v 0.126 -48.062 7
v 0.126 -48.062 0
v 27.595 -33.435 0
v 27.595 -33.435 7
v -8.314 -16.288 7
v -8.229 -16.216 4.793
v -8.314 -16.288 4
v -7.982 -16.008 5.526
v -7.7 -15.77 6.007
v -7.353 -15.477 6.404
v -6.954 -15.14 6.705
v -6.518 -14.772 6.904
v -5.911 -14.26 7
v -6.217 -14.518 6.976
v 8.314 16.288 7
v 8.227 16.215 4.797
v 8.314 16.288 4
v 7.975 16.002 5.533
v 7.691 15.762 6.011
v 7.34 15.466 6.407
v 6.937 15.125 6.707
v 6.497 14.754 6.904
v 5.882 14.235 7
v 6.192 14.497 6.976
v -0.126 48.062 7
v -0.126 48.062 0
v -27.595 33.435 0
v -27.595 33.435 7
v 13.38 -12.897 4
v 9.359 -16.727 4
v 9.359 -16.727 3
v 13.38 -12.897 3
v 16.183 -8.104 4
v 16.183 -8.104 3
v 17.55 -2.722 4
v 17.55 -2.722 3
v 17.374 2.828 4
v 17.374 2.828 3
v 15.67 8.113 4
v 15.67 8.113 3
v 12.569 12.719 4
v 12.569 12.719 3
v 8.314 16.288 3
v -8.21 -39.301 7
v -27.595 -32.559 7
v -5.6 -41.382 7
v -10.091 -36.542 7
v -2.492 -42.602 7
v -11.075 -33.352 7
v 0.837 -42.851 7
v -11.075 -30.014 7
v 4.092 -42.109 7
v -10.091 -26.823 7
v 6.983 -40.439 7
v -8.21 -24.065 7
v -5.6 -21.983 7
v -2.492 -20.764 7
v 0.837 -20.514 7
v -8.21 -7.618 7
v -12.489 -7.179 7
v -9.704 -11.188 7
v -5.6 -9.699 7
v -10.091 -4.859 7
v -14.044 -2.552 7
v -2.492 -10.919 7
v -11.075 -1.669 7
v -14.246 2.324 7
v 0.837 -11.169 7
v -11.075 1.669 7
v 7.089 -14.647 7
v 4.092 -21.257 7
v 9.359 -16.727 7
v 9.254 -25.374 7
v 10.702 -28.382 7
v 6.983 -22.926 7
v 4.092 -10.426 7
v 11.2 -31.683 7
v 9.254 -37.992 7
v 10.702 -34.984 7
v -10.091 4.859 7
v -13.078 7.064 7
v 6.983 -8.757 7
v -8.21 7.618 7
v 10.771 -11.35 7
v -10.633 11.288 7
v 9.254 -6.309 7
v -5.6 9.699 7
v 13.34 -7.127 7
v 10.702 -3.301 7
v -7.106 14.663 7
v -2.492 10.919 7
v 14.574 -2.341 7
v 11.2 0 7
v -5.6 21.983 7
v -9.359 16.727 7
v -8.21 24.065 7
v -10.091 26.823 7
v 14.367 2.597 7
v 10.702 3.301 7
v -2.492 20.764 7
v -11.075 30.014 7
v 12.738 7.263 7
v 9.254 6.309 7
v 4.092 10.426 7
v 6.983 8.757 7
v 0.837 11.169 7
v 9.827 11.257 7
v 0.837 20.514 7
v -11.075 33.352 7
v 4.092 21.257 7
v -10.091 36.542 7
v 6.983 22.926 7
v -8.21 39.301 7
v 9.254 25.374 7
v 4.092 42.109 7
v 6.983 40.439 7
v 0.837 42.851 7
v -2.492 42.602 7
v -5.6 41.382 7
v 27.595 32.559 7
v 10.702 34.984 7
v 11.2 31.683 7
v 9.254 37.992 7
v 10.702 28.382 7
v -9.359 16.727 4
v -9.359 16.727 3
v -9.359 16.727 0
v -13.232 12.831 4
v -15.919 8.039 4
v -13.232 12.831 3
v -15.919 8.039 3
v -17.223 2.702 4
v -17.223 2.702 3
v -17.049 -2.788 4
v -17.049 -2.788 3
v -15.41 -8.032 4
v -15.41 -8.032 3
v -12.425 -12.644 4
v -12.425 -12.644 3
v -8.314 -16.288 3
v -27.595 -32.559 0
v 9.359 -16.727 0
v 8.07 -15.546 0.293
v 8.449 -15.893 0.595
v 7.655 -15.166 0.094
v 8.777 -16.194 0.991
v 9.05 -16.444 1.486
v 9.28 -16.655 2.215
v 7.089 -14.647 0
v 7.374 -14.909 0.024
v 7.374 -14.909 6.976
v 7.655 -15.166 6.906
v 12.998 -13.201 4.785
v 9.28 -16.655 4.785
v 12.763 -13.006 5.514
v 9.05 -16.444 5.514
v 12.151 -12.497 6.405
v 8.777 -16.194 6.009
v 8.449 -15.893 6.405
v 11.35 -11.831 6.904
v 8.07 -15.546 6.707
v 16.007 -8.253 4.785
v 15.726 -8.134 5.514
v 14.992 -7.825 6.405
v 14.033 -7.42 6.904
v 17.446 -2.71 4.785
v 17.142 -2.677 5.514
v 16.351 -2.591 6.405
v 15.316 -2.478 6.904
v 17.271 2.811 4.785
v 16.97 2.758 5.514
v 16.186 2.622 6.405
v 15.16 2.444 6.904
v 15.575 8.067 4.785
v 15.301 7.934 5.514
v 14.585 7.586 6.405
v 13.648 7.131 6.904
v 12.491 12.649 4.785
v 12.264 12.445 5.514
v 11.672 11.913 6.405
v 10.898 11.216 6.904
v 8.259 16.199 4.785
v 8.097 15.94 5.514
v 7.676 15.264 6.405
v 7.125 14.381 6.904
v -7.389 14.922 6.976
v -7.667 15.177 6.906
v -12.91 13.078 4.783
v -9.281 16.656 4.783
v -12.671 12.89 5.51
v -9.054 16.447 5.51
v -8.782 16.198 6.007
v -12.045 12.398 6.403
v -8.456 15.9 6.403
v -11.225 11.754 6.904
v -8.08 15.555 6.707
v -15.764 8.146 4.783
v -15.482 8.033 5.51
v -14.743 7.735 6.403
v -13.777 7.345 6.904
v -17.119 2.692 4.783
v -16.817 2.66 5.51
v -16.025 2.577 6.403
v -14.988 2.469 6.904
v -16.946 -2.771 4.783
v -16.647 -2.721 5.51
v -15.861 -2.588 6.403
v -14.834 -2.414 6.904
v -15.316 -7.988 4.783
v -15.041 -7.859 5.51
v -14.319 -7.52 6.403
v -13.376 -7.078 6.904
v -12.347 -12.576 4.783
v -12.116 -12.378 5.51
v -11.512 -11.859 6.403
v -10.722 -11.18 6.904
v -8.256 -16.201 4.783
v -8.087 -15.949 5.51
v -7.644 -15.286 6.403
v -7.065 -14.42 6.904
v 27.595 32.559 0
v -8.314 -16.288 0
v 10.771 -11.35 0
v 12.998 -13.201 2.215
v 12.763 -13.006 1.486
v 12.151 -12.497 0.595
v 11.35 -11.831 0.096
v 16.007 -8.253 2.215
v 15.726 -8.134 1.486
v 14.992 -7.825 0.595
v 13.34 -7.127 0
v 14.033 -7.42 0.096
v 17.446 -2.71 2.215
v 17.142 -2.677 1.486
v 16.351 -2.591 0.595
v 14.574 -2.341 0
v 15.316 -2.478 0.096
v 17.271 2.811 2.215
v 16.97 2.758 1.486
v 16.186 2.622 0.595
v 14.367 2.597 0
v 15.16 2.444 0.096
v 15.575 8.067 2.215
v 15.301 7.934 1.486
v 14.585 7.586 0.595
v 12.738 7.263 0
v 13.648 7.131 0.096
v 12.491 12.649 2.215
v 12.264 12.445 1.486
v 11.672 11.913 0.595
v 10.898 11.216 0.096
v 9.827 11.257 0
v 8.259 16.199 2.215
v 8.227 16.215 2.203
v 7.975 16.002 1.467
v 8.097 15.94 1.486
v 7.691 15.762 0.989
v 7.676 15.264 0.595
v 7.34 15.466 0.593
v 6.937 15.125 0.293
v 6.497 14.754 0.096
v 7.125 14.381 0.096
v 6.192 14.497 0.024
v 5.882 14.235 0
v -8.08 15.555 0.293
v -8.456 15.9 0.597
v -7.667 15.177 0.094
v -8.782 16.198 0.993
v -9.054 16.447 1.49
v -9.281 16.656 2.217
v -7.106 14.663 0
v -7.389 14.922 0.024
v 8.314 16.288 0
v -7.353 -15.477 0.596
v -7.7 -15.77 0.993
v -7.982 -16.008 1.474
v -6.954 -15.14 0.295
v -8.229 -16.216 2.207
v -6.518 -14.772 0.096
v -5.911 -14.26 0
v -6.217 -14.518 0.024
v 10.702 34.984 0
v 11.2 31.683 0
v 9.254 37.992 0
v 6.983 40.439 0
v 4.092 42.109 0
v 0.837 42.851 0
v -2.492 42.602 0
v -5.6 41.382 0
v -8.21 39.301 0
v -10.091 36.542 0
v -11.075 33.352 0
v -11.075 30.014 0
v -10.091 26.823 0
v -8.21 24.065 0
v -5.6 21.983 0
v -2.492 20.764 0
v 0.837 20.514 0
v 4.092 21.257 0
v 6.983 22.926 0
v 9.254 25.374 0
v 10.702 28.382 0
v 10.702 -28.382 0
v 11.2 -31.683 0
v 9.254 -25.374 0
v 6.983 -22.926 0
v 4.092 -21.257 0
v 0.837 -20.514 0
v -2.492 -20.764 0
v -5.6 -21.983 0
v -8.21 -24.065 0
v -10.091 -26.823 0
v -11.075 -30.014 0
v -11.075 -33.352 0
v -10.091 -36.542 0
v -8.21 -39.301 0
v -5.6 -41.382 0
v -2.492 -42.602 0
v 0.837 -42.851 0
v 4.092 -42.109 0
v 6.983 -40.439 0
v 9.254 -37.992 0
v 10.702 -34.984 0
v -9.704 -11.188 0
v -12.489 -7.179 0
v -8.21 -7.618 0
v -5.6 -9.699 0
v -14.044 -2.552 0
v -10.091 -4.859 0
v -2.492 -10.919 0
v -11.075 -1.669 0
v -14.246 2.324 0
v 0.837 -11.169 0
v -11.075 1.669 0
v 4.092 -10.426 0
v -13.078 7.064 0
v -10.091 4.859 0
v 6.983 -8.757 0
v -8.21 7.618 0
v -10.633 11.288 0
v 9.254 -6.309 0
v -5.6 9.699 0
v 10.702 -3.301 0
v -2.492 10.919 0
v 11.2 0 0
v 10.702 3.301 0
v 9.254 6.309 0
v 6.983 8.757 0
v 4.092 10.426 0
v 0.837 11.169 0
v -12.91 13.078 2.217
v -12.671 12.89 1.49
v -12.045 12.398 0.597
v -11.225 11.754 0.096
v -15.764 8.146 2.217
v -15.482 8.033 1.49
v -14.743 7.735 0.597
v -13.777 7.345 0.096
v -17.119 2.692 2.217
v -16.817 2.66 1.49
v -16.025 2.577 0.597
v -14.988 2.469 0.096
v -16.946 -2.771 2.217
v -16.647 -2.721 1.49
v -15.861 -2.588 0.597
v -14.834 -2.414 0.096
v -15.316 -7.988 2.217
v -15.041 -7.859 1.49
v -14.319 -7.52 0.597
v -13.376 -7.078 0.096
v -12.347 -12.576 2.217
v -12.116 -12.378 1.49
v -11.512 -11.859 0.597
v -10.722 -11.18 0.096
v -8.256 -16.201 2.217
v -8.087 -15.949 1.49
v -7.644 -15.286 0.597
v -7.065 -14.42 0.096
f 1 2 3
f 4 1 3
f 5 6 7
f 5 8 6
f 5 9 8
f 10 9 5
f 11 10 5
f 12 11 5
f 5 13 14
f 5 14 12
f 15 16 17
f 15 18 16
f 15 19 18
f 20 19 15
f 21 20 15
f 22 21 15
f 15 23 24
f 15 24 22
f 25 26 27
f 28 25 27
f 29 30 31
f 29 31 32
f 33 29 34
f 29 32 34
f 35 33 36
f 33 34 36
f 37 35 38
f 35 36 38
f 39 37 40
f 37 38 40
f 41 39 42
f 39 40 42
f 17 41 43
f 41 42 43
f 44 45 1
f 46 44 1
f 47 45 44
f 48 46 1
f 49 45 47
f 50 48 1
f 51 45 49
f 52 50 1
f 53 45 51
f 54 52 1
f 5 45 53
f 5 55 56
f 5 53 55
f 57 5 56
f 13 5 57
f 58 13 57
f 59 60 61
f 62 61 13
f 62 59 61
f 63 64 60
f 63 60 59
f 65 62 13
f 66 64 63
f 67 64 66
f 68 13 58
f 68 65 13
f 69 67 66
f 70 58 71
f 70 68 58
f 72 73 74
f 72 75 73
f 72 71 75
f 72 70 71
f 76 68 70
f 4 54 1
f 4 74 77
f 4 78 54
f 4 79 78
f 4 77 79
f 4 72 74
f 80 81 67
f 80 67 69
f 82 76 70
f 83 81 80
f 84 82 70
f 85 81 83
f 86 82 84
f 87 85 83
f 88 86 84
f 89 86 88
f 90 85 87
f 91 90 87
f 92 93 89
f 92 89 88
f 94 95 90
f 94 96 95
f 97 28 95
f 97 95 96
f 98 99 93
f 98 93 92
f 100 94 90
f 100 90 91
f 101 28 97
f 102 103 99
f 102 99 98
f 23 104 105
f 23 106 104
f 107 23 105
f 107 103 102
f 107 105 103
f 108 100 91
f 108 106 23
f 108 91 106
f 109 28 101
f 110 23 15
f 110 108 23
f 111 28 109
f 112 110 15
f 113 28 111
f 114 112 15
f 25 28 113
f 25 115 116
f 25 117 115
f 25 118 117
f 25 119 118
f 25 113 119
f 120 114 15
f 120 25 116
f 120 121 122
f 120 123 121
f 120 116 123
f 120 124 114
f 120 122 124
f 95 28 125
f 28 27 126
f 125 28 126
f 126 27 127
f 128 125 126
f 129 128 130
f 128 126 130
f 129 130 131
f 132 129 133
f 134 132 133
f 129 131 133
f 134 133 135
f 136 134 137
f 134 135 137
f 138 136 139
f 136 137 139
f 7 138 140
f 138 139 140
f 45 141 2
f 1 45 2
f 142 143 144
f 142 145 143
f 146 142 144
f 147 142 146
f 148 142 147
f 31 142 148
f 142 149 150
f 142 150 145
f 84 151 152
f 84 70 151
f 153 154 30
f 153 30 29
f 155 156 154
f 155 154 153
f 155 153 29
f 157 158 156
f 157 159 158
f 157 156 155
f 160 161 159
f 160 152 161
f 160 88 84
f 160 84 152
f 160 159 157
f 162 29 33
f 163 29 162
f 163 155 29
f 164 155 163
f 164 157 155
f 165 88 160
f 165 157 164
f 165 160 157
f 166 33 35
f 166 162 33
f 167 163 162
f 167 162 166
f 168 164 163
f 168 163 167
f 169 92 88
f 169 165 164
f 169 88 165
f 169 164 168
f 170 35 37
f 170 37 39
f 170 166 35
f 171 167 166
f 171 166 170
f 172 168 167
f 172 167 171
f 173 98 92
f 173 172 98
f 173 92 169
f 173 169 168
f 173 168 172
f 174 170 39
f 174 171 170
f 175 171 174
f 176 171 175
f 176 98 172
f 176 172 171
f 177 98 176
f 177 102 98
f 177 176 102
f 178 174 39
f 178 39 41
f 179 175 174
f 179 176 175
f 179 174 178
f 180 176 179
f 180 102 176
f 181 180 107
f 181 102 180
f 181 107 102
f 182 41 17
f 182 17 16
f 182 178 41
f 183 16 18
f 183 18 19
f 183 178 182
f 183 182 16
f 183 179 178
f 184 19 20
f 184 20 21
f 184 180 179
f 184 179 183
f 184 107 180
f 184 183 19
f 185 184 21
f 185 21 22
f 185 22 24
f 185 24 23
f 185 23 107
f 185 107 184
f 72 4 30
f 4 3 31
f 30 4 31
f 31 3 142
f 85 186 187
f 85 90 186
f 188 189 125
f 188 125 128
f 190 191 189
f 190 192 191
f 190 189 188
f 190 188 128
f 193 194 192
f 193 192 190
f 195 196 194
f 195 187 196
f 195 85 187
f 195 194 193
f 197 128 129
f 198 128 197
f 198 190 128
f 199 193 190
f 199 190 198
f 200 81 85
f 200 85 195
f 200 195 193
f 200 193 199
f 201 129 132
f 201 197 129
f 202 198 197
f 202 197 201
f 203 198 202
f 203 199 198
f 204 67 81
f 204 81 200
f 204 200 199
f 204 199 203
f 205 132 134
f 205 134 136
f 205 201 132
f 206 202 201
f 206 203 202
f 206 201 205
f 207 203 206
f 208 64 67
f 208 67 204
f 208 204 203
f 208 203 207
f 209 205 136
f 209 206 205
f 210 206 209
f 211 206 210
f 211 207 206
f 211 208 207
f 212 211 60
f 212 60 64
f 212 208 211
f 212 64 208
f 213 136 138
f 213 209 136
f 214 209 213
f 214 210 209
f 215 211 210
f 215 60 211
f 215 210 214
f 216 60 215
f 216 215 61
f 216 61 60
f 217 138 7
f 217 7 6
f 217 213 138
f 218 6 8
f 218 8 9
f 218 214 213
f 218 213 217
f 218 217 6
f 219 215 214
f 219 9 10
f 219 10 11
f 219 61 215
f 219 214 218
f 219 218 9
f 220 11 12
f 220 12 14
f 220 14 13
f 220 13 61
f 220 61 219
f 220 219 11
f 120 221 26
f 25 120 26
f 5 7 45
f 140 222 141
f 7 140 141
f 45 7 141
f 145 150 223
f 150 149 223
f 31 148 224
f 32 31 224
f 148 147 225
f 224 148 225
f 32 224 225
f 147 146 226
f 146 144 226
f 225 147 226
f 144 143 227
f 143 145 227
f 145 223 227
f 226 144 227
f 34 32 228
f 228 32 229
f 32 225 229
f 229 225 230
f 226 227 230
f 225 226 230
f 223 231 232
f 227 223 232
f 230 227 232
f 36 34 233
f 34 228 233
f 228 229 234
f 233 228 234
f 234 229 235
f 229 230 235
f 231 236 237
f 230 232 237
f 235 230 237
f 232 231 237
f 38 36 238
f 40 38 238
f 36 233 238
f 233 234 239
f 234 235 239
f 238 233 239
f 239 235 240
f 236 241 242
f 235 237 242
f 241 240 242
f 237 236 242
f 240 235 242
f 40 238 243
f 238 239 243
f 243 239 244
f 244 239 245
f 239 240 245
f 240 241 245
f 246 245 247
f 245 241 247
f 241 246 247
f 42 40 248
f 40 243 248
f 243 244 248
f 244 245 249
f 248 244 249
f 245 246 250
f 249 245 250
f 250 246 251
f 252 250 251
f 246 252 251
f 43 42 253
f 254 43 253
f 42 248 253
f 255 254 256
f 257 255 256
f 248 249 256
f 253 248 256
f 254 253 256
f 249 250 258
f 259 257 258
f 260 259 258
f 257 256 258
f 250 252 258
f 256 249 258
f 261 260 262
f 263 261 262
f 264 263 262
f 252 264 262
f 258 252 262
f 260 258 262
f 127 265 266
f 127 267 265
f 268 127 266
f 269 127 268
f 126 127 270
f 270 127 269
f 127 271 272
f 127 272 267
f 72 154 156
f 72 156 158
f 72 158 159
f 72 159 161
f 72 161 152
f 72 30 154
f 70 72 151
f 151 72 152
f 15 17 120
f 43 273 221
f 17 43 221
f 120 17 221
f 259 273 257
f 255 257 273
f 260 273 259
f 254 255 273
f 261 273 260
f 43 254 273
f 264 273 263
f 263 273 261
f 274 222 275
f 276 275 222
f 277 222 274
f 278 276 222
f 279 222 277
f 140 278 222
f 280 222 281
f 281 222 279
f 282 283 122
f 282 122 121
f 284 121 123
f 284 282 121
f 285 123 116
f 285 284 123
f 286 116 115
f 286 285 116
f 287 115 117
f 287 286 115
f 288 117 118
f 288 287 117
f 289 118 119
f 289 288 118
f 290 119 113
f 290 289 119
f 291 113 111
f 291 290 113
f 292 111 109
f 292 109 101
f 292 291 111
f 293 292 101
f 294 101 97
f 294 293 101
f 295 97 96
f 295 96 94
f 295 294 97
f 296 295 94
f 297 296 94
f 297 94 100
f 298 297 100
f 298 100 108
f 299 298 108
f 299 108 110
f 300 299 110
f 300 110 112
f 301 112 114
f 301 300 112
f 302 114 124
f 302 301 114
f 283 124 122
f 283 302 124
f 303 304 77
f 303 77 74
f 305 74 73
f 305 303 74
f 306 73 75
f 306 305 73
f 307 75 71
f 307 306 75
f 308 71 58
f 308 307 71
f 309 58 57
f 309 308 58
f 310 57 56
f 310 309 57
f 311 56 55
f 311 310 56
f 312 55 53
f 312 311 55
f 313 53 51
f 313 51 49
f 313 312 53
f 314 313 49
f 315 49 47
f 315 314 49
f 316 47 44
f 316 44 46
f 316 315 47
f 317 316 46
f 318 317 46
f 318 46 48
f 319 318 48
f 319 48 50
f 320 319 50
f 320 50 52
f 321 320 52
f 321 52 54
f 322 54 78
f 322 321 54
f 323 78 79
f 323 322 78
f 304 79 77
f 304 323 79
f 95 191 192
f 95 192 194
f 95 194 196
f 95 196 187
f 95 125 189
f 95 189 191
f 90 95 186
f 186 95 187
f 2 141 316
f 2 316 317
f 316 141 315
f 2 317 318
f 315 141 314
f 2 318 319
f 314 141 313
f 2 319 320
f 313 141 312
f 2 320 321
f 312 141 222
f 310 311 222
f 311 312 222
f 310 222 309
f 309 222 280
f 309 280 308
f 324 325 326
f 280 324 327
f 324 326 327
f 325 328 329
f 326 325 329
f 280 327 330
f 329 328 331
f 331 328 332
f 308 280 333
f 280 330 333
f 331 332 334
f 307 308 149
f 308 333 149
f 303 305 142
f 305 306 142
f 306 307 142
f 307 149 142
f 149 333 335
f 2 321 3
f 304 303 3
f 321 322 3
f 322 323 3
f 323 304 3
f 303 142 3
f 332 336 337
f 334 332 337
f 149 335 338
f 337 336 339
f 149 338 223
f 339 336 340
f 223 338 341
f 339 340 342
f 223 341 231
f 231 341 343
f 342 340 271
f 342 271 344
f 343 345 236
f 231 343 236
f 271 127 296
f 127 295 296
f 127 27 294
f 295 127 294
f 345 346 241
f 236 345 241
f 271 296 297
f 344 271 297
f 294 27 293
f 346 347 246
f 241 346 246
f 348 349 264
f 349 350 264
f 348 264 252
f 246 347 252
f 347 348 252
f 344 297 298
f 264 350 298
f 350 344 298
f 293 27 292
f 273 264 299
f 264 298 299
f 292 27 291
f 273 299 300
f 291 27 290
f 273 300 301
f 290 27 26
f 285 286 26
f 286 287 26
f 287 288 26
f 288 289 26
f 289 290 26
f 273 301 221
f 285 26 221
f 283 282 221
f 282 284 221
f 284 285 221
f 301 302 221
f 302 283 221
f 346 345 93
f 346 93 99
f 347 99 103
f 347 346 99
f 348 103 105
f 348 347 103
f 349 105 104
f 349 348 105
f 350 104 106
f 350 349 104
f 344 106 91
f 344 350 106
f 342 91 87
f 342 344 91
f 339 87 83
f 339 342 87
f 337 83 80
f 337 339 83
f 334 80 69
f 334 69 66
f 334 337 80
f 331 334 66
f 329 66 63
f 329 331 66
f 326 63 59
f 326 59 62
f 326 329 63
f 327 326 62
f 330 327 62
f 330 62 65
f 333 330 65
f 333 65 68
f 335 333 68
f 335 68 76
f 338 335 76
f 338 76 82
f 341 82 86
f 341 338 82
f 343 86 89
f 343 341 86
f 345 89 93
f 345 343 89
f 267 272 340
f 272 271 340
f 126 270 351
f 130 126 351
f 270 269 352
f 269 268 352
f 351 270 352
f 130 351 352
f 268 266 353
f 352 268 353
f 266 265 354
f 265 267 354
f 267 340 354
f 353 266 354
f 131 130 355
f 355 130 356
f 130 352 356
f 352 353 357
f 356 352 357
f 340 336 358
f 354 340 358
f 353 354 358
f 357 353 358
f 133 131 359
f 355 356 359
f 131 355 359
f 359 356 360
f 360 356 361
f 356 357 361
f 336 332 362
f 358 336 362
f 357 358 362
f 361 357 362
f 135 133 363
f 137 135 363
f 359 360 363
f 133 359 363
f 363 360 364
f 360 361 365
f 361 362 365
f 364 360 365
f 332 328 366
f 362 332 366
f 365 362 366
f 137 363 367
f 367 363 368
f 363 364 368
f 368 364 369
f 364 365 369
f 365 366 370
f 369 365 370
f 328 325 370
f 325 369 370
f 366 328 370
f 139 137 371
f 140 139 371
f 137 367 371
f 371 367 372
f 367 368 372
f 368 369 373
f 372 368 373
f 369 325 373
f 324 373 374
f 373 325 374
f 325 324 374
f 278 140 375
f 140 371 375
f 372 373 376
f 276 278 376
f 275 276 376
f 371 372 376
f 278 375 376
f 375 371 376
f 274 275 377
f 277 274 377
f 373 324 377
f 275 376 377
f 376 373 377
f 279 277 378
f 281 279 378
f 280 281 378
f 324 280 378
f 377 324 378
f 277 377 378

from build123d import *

# Parameters (mm, degrees)
F0_R         = 11.2
F1_DEPTH     = 7
F2_T4_ANGLE  = 151.1667099625
F2_T10_ANGLE = 155.7575231718
F2_T16_ANGLE = 151.1667099625
F2_T22_ANGLE = 155.7575231718


# Not quite as in the source:
# - a fillet or chamfer that OpenCascade refuses, or shapes differently, is made with other operations: its cross-section is extruded or revolved along the edge and cut away or added


with BuildPart() as f1:
    # F0 (on Top) → F1 (new body)
    with BuildSketch(Plane.XY):
        with BuildLine():
            ThreePointArc((9.3591465956, -16.7270162039), (17.6571466732, 0.0595617509), (8.3139799998, 16.2876621091))
            Line((8.3139799998, 16.2876621091), (-9.3591465956, 16.7270162039))
            ThreePointArc((-9.3591465956, 16.7270162039), (-17.3223324531, -0.048962325), (-8.3139799998, -16.2876621091))
            Line((-8.3139799998, -16.2876621091), (9.3591465956, -16.7270162039))
        make_face()
        Circle(F0_R, mode=Mode.SUBTRACT)
        Polygon((8.3139799998, 16.2876621091), (27.5946892798, 32.5588136911), (-0.1261595724, 48.0615143736), (-27.5946892798, 33.4348380566), (-9.3591465956, 16.7270162039), align=None)
        with Locations((0, 31.6827967763)):
            Circle(F0_R, mode=Mode.SUBTRACT)
        Polygon((27.5946892798, -33.4348380566), (9.3591465956, -16.7270162039), (-8.3139799998, -16.2876621091), (-27.5946892798, -32.5588136911), (0.1261595724, -48.0615143736), align=None)
        with Locations((0, -31.6827967763)):
            Circle(F0_R, mode=Mode.SUBTRACT)
    extrude(amount=F1_DEPTH)

    # F2: fillet of radius 3 on 4 edges, made by hand


with BuildPart() as f2_tool2:
    # F2_s3 → F2_t4 (revolve)
    with BuildSketch(Plane(origin=(2.9031932082, 0.8450981198, 0), x_dir=(0, 0, 1), z_dir=(0.9601480198, 0.2794920035, 0))):
        with BuildLine():
            ThreePointArc((4, -20.0470026749), (6.1213203436, -19.1683230184), (7, -17.0470026749))
            Line((7, -17.0470026749), (7, -20.0470026749))
            Line((7, -20.0470026749), (4, -20.0470026749))
        make_face()
    revolve(axis=Axis((2.9763887281, 0.5936471566, 7), (0, 0, 1)), revolution_arc=F2_T4_ANGLE)

    split(bisect_by=Plane(origin=(4.0604237069, 4.4316985467, 0), x_dir=(0, 0, 1), z_dir=(-0.6755468125, -0.7373170987, 0)), keep=Keep.TOP)

    split(bisect_by=Plane(origin=(4.569745577, -5.414978498, 0), x_dir=(0, 0, 1), z_dir=(-0.6449416276, 0.7642318346, 0)), keep=Keep.TOP)


with BuildPart() as f1_1:
    add(f1.part)

    # F2_t1: cut F2_tool2
    add(f2_tool2.part, mode=Mode.SUBTRACT)


with BuildPart() as f2_tool8:
    # F2_s9 → F2_t10 (revolve)
    with BuildSketch(Plane(origin=(-2.2049800931, -0.547085883, 0), x_dir=(0, 0, 1), z_dir=(-0.9705717322, -0.2408121936, 0))):
        with BuildLine():
            ThreePointArc((4, -19.889257837), (6.1213203436, -19.0105781805), (7, -16.889257837))
            Line((7, -16.889257837), (7, -19.889257837))
            Line((7, -19.889257837), (4, -19.889257837))
        make_face()
    revolve(axis=Axis((-2.1995295918, -0.5690536346, 7), (0, 0, 1)), revolution_arc=F2_T10_ANGLE)

    split(bisect_by=Plane(origin=(-4.0604237069, -4.4316985467, 0), x_dir=(0, 0, 1), z_dir=(0.6755468125, 0.7373170987, 0)), keep=Keep.TOP)

    split(bisect_by=Plane(origin=(-4.569745577, 5.414978498, 0), x_dir=(0, 0, 1), z_dir=(0.6449416276, -0.7642318346, 0)), keep=Keep.TOP)


with BuildPart() as f1_2:
    add(f1_1.part)

    # F2_t7: cut F2_tool8
    add(f2_tool8.part, mode=Mode.SUBTRACT)


with BuildPart() as f2_tool14:
    # F2_s15 → F2_t16 (revolve)
    with BuildSketch(Plane(origin=(2.9031932082, 0.8450981198, 0), x_dir=(0, 0, 1), z_dir=(0.9601480198, 0.2794920035, 0))):
        with BuildLine():
            ThreePointArc((3, -20.0470026749), (0.8786796564, -19.1683230184), (0, -17.0470026749))
            Line((0, -17.0470026749), (0, -20.0470026749))
            Line((0, -20.0470026749), (3, -20.0470026749))
        make_face()
    revolve(axis=Axis((2.9763887281, 0.5936471566, 0), (0, 0, 1)), revolution_arc=F2_T16_ANGLE)

    split(bisect_by=Plane(origin=(4.0604237069, 4.4316985467, 0), x_dir=(0, 0, 1), z_dir=(-0.6755468125, -0.7373170987, 0)), keep=Keep.TOP)

    split(bisect_by=Plane(origin=(4.569745577, -5.414978498, 0), x_dir=(0, 0, 1), z_dir=(-0.6449416276, 0.7642318346, 0)), keep=Keep.TOP)


with BuildPart() as f1_3:
    add(f1_2.part)

    # F2_t13: cut F2_tool14
    add(f2_tool14.part, mode=Mode.SUBTRACT)


with BuildPart() as f2_tool20:
    # F2_s21 → F2_t22 (revolve)
    with BuildSketch(Plane(origin=(-2.2049800931, -0.547085883, 0), x_dir=(0, 0, 1), z_dir=(-0.9705717322, -0.2408121936, 0))):
        with BuildLine():
            ThreePointArc((3, -19.889257837), (0.8786796564, -19.0105781805), (0, -16.889257837))
            Line((0, -16.889257837), (0, -19.889257837))
            Line((0, -19.889257837), (3, -19.889257837))
        make_face()
    revolve(axis=Axis((-2.1995295918, -0.5690536346, 0), (0, 0, 1)), revolution_arc=F2_T22_ANGLE)

    split(bisect_by=Plane(origin=(-4.0604237069, -4.4316985467, 0), x_dir=(0, 0, 1), z_dir=(0.6755468125, 0.7373170987, 0)), keep=Keep.TOP)

    split(bisect_by=Plane(origin=(-4.569745577, 5.414978498, 0), x_dir=(0, 0, 1), z_dir=(0.6449416276, -0.7642318346, 0)), keep=Keep.TOP)


with BuildPart() as f1_4:
    add(f1_3.part)

    # F2_t19: cut F2_tool20
    add(f2_tool20.part, mode=Mode.SUBTRACT)


solid = f1_4.part
